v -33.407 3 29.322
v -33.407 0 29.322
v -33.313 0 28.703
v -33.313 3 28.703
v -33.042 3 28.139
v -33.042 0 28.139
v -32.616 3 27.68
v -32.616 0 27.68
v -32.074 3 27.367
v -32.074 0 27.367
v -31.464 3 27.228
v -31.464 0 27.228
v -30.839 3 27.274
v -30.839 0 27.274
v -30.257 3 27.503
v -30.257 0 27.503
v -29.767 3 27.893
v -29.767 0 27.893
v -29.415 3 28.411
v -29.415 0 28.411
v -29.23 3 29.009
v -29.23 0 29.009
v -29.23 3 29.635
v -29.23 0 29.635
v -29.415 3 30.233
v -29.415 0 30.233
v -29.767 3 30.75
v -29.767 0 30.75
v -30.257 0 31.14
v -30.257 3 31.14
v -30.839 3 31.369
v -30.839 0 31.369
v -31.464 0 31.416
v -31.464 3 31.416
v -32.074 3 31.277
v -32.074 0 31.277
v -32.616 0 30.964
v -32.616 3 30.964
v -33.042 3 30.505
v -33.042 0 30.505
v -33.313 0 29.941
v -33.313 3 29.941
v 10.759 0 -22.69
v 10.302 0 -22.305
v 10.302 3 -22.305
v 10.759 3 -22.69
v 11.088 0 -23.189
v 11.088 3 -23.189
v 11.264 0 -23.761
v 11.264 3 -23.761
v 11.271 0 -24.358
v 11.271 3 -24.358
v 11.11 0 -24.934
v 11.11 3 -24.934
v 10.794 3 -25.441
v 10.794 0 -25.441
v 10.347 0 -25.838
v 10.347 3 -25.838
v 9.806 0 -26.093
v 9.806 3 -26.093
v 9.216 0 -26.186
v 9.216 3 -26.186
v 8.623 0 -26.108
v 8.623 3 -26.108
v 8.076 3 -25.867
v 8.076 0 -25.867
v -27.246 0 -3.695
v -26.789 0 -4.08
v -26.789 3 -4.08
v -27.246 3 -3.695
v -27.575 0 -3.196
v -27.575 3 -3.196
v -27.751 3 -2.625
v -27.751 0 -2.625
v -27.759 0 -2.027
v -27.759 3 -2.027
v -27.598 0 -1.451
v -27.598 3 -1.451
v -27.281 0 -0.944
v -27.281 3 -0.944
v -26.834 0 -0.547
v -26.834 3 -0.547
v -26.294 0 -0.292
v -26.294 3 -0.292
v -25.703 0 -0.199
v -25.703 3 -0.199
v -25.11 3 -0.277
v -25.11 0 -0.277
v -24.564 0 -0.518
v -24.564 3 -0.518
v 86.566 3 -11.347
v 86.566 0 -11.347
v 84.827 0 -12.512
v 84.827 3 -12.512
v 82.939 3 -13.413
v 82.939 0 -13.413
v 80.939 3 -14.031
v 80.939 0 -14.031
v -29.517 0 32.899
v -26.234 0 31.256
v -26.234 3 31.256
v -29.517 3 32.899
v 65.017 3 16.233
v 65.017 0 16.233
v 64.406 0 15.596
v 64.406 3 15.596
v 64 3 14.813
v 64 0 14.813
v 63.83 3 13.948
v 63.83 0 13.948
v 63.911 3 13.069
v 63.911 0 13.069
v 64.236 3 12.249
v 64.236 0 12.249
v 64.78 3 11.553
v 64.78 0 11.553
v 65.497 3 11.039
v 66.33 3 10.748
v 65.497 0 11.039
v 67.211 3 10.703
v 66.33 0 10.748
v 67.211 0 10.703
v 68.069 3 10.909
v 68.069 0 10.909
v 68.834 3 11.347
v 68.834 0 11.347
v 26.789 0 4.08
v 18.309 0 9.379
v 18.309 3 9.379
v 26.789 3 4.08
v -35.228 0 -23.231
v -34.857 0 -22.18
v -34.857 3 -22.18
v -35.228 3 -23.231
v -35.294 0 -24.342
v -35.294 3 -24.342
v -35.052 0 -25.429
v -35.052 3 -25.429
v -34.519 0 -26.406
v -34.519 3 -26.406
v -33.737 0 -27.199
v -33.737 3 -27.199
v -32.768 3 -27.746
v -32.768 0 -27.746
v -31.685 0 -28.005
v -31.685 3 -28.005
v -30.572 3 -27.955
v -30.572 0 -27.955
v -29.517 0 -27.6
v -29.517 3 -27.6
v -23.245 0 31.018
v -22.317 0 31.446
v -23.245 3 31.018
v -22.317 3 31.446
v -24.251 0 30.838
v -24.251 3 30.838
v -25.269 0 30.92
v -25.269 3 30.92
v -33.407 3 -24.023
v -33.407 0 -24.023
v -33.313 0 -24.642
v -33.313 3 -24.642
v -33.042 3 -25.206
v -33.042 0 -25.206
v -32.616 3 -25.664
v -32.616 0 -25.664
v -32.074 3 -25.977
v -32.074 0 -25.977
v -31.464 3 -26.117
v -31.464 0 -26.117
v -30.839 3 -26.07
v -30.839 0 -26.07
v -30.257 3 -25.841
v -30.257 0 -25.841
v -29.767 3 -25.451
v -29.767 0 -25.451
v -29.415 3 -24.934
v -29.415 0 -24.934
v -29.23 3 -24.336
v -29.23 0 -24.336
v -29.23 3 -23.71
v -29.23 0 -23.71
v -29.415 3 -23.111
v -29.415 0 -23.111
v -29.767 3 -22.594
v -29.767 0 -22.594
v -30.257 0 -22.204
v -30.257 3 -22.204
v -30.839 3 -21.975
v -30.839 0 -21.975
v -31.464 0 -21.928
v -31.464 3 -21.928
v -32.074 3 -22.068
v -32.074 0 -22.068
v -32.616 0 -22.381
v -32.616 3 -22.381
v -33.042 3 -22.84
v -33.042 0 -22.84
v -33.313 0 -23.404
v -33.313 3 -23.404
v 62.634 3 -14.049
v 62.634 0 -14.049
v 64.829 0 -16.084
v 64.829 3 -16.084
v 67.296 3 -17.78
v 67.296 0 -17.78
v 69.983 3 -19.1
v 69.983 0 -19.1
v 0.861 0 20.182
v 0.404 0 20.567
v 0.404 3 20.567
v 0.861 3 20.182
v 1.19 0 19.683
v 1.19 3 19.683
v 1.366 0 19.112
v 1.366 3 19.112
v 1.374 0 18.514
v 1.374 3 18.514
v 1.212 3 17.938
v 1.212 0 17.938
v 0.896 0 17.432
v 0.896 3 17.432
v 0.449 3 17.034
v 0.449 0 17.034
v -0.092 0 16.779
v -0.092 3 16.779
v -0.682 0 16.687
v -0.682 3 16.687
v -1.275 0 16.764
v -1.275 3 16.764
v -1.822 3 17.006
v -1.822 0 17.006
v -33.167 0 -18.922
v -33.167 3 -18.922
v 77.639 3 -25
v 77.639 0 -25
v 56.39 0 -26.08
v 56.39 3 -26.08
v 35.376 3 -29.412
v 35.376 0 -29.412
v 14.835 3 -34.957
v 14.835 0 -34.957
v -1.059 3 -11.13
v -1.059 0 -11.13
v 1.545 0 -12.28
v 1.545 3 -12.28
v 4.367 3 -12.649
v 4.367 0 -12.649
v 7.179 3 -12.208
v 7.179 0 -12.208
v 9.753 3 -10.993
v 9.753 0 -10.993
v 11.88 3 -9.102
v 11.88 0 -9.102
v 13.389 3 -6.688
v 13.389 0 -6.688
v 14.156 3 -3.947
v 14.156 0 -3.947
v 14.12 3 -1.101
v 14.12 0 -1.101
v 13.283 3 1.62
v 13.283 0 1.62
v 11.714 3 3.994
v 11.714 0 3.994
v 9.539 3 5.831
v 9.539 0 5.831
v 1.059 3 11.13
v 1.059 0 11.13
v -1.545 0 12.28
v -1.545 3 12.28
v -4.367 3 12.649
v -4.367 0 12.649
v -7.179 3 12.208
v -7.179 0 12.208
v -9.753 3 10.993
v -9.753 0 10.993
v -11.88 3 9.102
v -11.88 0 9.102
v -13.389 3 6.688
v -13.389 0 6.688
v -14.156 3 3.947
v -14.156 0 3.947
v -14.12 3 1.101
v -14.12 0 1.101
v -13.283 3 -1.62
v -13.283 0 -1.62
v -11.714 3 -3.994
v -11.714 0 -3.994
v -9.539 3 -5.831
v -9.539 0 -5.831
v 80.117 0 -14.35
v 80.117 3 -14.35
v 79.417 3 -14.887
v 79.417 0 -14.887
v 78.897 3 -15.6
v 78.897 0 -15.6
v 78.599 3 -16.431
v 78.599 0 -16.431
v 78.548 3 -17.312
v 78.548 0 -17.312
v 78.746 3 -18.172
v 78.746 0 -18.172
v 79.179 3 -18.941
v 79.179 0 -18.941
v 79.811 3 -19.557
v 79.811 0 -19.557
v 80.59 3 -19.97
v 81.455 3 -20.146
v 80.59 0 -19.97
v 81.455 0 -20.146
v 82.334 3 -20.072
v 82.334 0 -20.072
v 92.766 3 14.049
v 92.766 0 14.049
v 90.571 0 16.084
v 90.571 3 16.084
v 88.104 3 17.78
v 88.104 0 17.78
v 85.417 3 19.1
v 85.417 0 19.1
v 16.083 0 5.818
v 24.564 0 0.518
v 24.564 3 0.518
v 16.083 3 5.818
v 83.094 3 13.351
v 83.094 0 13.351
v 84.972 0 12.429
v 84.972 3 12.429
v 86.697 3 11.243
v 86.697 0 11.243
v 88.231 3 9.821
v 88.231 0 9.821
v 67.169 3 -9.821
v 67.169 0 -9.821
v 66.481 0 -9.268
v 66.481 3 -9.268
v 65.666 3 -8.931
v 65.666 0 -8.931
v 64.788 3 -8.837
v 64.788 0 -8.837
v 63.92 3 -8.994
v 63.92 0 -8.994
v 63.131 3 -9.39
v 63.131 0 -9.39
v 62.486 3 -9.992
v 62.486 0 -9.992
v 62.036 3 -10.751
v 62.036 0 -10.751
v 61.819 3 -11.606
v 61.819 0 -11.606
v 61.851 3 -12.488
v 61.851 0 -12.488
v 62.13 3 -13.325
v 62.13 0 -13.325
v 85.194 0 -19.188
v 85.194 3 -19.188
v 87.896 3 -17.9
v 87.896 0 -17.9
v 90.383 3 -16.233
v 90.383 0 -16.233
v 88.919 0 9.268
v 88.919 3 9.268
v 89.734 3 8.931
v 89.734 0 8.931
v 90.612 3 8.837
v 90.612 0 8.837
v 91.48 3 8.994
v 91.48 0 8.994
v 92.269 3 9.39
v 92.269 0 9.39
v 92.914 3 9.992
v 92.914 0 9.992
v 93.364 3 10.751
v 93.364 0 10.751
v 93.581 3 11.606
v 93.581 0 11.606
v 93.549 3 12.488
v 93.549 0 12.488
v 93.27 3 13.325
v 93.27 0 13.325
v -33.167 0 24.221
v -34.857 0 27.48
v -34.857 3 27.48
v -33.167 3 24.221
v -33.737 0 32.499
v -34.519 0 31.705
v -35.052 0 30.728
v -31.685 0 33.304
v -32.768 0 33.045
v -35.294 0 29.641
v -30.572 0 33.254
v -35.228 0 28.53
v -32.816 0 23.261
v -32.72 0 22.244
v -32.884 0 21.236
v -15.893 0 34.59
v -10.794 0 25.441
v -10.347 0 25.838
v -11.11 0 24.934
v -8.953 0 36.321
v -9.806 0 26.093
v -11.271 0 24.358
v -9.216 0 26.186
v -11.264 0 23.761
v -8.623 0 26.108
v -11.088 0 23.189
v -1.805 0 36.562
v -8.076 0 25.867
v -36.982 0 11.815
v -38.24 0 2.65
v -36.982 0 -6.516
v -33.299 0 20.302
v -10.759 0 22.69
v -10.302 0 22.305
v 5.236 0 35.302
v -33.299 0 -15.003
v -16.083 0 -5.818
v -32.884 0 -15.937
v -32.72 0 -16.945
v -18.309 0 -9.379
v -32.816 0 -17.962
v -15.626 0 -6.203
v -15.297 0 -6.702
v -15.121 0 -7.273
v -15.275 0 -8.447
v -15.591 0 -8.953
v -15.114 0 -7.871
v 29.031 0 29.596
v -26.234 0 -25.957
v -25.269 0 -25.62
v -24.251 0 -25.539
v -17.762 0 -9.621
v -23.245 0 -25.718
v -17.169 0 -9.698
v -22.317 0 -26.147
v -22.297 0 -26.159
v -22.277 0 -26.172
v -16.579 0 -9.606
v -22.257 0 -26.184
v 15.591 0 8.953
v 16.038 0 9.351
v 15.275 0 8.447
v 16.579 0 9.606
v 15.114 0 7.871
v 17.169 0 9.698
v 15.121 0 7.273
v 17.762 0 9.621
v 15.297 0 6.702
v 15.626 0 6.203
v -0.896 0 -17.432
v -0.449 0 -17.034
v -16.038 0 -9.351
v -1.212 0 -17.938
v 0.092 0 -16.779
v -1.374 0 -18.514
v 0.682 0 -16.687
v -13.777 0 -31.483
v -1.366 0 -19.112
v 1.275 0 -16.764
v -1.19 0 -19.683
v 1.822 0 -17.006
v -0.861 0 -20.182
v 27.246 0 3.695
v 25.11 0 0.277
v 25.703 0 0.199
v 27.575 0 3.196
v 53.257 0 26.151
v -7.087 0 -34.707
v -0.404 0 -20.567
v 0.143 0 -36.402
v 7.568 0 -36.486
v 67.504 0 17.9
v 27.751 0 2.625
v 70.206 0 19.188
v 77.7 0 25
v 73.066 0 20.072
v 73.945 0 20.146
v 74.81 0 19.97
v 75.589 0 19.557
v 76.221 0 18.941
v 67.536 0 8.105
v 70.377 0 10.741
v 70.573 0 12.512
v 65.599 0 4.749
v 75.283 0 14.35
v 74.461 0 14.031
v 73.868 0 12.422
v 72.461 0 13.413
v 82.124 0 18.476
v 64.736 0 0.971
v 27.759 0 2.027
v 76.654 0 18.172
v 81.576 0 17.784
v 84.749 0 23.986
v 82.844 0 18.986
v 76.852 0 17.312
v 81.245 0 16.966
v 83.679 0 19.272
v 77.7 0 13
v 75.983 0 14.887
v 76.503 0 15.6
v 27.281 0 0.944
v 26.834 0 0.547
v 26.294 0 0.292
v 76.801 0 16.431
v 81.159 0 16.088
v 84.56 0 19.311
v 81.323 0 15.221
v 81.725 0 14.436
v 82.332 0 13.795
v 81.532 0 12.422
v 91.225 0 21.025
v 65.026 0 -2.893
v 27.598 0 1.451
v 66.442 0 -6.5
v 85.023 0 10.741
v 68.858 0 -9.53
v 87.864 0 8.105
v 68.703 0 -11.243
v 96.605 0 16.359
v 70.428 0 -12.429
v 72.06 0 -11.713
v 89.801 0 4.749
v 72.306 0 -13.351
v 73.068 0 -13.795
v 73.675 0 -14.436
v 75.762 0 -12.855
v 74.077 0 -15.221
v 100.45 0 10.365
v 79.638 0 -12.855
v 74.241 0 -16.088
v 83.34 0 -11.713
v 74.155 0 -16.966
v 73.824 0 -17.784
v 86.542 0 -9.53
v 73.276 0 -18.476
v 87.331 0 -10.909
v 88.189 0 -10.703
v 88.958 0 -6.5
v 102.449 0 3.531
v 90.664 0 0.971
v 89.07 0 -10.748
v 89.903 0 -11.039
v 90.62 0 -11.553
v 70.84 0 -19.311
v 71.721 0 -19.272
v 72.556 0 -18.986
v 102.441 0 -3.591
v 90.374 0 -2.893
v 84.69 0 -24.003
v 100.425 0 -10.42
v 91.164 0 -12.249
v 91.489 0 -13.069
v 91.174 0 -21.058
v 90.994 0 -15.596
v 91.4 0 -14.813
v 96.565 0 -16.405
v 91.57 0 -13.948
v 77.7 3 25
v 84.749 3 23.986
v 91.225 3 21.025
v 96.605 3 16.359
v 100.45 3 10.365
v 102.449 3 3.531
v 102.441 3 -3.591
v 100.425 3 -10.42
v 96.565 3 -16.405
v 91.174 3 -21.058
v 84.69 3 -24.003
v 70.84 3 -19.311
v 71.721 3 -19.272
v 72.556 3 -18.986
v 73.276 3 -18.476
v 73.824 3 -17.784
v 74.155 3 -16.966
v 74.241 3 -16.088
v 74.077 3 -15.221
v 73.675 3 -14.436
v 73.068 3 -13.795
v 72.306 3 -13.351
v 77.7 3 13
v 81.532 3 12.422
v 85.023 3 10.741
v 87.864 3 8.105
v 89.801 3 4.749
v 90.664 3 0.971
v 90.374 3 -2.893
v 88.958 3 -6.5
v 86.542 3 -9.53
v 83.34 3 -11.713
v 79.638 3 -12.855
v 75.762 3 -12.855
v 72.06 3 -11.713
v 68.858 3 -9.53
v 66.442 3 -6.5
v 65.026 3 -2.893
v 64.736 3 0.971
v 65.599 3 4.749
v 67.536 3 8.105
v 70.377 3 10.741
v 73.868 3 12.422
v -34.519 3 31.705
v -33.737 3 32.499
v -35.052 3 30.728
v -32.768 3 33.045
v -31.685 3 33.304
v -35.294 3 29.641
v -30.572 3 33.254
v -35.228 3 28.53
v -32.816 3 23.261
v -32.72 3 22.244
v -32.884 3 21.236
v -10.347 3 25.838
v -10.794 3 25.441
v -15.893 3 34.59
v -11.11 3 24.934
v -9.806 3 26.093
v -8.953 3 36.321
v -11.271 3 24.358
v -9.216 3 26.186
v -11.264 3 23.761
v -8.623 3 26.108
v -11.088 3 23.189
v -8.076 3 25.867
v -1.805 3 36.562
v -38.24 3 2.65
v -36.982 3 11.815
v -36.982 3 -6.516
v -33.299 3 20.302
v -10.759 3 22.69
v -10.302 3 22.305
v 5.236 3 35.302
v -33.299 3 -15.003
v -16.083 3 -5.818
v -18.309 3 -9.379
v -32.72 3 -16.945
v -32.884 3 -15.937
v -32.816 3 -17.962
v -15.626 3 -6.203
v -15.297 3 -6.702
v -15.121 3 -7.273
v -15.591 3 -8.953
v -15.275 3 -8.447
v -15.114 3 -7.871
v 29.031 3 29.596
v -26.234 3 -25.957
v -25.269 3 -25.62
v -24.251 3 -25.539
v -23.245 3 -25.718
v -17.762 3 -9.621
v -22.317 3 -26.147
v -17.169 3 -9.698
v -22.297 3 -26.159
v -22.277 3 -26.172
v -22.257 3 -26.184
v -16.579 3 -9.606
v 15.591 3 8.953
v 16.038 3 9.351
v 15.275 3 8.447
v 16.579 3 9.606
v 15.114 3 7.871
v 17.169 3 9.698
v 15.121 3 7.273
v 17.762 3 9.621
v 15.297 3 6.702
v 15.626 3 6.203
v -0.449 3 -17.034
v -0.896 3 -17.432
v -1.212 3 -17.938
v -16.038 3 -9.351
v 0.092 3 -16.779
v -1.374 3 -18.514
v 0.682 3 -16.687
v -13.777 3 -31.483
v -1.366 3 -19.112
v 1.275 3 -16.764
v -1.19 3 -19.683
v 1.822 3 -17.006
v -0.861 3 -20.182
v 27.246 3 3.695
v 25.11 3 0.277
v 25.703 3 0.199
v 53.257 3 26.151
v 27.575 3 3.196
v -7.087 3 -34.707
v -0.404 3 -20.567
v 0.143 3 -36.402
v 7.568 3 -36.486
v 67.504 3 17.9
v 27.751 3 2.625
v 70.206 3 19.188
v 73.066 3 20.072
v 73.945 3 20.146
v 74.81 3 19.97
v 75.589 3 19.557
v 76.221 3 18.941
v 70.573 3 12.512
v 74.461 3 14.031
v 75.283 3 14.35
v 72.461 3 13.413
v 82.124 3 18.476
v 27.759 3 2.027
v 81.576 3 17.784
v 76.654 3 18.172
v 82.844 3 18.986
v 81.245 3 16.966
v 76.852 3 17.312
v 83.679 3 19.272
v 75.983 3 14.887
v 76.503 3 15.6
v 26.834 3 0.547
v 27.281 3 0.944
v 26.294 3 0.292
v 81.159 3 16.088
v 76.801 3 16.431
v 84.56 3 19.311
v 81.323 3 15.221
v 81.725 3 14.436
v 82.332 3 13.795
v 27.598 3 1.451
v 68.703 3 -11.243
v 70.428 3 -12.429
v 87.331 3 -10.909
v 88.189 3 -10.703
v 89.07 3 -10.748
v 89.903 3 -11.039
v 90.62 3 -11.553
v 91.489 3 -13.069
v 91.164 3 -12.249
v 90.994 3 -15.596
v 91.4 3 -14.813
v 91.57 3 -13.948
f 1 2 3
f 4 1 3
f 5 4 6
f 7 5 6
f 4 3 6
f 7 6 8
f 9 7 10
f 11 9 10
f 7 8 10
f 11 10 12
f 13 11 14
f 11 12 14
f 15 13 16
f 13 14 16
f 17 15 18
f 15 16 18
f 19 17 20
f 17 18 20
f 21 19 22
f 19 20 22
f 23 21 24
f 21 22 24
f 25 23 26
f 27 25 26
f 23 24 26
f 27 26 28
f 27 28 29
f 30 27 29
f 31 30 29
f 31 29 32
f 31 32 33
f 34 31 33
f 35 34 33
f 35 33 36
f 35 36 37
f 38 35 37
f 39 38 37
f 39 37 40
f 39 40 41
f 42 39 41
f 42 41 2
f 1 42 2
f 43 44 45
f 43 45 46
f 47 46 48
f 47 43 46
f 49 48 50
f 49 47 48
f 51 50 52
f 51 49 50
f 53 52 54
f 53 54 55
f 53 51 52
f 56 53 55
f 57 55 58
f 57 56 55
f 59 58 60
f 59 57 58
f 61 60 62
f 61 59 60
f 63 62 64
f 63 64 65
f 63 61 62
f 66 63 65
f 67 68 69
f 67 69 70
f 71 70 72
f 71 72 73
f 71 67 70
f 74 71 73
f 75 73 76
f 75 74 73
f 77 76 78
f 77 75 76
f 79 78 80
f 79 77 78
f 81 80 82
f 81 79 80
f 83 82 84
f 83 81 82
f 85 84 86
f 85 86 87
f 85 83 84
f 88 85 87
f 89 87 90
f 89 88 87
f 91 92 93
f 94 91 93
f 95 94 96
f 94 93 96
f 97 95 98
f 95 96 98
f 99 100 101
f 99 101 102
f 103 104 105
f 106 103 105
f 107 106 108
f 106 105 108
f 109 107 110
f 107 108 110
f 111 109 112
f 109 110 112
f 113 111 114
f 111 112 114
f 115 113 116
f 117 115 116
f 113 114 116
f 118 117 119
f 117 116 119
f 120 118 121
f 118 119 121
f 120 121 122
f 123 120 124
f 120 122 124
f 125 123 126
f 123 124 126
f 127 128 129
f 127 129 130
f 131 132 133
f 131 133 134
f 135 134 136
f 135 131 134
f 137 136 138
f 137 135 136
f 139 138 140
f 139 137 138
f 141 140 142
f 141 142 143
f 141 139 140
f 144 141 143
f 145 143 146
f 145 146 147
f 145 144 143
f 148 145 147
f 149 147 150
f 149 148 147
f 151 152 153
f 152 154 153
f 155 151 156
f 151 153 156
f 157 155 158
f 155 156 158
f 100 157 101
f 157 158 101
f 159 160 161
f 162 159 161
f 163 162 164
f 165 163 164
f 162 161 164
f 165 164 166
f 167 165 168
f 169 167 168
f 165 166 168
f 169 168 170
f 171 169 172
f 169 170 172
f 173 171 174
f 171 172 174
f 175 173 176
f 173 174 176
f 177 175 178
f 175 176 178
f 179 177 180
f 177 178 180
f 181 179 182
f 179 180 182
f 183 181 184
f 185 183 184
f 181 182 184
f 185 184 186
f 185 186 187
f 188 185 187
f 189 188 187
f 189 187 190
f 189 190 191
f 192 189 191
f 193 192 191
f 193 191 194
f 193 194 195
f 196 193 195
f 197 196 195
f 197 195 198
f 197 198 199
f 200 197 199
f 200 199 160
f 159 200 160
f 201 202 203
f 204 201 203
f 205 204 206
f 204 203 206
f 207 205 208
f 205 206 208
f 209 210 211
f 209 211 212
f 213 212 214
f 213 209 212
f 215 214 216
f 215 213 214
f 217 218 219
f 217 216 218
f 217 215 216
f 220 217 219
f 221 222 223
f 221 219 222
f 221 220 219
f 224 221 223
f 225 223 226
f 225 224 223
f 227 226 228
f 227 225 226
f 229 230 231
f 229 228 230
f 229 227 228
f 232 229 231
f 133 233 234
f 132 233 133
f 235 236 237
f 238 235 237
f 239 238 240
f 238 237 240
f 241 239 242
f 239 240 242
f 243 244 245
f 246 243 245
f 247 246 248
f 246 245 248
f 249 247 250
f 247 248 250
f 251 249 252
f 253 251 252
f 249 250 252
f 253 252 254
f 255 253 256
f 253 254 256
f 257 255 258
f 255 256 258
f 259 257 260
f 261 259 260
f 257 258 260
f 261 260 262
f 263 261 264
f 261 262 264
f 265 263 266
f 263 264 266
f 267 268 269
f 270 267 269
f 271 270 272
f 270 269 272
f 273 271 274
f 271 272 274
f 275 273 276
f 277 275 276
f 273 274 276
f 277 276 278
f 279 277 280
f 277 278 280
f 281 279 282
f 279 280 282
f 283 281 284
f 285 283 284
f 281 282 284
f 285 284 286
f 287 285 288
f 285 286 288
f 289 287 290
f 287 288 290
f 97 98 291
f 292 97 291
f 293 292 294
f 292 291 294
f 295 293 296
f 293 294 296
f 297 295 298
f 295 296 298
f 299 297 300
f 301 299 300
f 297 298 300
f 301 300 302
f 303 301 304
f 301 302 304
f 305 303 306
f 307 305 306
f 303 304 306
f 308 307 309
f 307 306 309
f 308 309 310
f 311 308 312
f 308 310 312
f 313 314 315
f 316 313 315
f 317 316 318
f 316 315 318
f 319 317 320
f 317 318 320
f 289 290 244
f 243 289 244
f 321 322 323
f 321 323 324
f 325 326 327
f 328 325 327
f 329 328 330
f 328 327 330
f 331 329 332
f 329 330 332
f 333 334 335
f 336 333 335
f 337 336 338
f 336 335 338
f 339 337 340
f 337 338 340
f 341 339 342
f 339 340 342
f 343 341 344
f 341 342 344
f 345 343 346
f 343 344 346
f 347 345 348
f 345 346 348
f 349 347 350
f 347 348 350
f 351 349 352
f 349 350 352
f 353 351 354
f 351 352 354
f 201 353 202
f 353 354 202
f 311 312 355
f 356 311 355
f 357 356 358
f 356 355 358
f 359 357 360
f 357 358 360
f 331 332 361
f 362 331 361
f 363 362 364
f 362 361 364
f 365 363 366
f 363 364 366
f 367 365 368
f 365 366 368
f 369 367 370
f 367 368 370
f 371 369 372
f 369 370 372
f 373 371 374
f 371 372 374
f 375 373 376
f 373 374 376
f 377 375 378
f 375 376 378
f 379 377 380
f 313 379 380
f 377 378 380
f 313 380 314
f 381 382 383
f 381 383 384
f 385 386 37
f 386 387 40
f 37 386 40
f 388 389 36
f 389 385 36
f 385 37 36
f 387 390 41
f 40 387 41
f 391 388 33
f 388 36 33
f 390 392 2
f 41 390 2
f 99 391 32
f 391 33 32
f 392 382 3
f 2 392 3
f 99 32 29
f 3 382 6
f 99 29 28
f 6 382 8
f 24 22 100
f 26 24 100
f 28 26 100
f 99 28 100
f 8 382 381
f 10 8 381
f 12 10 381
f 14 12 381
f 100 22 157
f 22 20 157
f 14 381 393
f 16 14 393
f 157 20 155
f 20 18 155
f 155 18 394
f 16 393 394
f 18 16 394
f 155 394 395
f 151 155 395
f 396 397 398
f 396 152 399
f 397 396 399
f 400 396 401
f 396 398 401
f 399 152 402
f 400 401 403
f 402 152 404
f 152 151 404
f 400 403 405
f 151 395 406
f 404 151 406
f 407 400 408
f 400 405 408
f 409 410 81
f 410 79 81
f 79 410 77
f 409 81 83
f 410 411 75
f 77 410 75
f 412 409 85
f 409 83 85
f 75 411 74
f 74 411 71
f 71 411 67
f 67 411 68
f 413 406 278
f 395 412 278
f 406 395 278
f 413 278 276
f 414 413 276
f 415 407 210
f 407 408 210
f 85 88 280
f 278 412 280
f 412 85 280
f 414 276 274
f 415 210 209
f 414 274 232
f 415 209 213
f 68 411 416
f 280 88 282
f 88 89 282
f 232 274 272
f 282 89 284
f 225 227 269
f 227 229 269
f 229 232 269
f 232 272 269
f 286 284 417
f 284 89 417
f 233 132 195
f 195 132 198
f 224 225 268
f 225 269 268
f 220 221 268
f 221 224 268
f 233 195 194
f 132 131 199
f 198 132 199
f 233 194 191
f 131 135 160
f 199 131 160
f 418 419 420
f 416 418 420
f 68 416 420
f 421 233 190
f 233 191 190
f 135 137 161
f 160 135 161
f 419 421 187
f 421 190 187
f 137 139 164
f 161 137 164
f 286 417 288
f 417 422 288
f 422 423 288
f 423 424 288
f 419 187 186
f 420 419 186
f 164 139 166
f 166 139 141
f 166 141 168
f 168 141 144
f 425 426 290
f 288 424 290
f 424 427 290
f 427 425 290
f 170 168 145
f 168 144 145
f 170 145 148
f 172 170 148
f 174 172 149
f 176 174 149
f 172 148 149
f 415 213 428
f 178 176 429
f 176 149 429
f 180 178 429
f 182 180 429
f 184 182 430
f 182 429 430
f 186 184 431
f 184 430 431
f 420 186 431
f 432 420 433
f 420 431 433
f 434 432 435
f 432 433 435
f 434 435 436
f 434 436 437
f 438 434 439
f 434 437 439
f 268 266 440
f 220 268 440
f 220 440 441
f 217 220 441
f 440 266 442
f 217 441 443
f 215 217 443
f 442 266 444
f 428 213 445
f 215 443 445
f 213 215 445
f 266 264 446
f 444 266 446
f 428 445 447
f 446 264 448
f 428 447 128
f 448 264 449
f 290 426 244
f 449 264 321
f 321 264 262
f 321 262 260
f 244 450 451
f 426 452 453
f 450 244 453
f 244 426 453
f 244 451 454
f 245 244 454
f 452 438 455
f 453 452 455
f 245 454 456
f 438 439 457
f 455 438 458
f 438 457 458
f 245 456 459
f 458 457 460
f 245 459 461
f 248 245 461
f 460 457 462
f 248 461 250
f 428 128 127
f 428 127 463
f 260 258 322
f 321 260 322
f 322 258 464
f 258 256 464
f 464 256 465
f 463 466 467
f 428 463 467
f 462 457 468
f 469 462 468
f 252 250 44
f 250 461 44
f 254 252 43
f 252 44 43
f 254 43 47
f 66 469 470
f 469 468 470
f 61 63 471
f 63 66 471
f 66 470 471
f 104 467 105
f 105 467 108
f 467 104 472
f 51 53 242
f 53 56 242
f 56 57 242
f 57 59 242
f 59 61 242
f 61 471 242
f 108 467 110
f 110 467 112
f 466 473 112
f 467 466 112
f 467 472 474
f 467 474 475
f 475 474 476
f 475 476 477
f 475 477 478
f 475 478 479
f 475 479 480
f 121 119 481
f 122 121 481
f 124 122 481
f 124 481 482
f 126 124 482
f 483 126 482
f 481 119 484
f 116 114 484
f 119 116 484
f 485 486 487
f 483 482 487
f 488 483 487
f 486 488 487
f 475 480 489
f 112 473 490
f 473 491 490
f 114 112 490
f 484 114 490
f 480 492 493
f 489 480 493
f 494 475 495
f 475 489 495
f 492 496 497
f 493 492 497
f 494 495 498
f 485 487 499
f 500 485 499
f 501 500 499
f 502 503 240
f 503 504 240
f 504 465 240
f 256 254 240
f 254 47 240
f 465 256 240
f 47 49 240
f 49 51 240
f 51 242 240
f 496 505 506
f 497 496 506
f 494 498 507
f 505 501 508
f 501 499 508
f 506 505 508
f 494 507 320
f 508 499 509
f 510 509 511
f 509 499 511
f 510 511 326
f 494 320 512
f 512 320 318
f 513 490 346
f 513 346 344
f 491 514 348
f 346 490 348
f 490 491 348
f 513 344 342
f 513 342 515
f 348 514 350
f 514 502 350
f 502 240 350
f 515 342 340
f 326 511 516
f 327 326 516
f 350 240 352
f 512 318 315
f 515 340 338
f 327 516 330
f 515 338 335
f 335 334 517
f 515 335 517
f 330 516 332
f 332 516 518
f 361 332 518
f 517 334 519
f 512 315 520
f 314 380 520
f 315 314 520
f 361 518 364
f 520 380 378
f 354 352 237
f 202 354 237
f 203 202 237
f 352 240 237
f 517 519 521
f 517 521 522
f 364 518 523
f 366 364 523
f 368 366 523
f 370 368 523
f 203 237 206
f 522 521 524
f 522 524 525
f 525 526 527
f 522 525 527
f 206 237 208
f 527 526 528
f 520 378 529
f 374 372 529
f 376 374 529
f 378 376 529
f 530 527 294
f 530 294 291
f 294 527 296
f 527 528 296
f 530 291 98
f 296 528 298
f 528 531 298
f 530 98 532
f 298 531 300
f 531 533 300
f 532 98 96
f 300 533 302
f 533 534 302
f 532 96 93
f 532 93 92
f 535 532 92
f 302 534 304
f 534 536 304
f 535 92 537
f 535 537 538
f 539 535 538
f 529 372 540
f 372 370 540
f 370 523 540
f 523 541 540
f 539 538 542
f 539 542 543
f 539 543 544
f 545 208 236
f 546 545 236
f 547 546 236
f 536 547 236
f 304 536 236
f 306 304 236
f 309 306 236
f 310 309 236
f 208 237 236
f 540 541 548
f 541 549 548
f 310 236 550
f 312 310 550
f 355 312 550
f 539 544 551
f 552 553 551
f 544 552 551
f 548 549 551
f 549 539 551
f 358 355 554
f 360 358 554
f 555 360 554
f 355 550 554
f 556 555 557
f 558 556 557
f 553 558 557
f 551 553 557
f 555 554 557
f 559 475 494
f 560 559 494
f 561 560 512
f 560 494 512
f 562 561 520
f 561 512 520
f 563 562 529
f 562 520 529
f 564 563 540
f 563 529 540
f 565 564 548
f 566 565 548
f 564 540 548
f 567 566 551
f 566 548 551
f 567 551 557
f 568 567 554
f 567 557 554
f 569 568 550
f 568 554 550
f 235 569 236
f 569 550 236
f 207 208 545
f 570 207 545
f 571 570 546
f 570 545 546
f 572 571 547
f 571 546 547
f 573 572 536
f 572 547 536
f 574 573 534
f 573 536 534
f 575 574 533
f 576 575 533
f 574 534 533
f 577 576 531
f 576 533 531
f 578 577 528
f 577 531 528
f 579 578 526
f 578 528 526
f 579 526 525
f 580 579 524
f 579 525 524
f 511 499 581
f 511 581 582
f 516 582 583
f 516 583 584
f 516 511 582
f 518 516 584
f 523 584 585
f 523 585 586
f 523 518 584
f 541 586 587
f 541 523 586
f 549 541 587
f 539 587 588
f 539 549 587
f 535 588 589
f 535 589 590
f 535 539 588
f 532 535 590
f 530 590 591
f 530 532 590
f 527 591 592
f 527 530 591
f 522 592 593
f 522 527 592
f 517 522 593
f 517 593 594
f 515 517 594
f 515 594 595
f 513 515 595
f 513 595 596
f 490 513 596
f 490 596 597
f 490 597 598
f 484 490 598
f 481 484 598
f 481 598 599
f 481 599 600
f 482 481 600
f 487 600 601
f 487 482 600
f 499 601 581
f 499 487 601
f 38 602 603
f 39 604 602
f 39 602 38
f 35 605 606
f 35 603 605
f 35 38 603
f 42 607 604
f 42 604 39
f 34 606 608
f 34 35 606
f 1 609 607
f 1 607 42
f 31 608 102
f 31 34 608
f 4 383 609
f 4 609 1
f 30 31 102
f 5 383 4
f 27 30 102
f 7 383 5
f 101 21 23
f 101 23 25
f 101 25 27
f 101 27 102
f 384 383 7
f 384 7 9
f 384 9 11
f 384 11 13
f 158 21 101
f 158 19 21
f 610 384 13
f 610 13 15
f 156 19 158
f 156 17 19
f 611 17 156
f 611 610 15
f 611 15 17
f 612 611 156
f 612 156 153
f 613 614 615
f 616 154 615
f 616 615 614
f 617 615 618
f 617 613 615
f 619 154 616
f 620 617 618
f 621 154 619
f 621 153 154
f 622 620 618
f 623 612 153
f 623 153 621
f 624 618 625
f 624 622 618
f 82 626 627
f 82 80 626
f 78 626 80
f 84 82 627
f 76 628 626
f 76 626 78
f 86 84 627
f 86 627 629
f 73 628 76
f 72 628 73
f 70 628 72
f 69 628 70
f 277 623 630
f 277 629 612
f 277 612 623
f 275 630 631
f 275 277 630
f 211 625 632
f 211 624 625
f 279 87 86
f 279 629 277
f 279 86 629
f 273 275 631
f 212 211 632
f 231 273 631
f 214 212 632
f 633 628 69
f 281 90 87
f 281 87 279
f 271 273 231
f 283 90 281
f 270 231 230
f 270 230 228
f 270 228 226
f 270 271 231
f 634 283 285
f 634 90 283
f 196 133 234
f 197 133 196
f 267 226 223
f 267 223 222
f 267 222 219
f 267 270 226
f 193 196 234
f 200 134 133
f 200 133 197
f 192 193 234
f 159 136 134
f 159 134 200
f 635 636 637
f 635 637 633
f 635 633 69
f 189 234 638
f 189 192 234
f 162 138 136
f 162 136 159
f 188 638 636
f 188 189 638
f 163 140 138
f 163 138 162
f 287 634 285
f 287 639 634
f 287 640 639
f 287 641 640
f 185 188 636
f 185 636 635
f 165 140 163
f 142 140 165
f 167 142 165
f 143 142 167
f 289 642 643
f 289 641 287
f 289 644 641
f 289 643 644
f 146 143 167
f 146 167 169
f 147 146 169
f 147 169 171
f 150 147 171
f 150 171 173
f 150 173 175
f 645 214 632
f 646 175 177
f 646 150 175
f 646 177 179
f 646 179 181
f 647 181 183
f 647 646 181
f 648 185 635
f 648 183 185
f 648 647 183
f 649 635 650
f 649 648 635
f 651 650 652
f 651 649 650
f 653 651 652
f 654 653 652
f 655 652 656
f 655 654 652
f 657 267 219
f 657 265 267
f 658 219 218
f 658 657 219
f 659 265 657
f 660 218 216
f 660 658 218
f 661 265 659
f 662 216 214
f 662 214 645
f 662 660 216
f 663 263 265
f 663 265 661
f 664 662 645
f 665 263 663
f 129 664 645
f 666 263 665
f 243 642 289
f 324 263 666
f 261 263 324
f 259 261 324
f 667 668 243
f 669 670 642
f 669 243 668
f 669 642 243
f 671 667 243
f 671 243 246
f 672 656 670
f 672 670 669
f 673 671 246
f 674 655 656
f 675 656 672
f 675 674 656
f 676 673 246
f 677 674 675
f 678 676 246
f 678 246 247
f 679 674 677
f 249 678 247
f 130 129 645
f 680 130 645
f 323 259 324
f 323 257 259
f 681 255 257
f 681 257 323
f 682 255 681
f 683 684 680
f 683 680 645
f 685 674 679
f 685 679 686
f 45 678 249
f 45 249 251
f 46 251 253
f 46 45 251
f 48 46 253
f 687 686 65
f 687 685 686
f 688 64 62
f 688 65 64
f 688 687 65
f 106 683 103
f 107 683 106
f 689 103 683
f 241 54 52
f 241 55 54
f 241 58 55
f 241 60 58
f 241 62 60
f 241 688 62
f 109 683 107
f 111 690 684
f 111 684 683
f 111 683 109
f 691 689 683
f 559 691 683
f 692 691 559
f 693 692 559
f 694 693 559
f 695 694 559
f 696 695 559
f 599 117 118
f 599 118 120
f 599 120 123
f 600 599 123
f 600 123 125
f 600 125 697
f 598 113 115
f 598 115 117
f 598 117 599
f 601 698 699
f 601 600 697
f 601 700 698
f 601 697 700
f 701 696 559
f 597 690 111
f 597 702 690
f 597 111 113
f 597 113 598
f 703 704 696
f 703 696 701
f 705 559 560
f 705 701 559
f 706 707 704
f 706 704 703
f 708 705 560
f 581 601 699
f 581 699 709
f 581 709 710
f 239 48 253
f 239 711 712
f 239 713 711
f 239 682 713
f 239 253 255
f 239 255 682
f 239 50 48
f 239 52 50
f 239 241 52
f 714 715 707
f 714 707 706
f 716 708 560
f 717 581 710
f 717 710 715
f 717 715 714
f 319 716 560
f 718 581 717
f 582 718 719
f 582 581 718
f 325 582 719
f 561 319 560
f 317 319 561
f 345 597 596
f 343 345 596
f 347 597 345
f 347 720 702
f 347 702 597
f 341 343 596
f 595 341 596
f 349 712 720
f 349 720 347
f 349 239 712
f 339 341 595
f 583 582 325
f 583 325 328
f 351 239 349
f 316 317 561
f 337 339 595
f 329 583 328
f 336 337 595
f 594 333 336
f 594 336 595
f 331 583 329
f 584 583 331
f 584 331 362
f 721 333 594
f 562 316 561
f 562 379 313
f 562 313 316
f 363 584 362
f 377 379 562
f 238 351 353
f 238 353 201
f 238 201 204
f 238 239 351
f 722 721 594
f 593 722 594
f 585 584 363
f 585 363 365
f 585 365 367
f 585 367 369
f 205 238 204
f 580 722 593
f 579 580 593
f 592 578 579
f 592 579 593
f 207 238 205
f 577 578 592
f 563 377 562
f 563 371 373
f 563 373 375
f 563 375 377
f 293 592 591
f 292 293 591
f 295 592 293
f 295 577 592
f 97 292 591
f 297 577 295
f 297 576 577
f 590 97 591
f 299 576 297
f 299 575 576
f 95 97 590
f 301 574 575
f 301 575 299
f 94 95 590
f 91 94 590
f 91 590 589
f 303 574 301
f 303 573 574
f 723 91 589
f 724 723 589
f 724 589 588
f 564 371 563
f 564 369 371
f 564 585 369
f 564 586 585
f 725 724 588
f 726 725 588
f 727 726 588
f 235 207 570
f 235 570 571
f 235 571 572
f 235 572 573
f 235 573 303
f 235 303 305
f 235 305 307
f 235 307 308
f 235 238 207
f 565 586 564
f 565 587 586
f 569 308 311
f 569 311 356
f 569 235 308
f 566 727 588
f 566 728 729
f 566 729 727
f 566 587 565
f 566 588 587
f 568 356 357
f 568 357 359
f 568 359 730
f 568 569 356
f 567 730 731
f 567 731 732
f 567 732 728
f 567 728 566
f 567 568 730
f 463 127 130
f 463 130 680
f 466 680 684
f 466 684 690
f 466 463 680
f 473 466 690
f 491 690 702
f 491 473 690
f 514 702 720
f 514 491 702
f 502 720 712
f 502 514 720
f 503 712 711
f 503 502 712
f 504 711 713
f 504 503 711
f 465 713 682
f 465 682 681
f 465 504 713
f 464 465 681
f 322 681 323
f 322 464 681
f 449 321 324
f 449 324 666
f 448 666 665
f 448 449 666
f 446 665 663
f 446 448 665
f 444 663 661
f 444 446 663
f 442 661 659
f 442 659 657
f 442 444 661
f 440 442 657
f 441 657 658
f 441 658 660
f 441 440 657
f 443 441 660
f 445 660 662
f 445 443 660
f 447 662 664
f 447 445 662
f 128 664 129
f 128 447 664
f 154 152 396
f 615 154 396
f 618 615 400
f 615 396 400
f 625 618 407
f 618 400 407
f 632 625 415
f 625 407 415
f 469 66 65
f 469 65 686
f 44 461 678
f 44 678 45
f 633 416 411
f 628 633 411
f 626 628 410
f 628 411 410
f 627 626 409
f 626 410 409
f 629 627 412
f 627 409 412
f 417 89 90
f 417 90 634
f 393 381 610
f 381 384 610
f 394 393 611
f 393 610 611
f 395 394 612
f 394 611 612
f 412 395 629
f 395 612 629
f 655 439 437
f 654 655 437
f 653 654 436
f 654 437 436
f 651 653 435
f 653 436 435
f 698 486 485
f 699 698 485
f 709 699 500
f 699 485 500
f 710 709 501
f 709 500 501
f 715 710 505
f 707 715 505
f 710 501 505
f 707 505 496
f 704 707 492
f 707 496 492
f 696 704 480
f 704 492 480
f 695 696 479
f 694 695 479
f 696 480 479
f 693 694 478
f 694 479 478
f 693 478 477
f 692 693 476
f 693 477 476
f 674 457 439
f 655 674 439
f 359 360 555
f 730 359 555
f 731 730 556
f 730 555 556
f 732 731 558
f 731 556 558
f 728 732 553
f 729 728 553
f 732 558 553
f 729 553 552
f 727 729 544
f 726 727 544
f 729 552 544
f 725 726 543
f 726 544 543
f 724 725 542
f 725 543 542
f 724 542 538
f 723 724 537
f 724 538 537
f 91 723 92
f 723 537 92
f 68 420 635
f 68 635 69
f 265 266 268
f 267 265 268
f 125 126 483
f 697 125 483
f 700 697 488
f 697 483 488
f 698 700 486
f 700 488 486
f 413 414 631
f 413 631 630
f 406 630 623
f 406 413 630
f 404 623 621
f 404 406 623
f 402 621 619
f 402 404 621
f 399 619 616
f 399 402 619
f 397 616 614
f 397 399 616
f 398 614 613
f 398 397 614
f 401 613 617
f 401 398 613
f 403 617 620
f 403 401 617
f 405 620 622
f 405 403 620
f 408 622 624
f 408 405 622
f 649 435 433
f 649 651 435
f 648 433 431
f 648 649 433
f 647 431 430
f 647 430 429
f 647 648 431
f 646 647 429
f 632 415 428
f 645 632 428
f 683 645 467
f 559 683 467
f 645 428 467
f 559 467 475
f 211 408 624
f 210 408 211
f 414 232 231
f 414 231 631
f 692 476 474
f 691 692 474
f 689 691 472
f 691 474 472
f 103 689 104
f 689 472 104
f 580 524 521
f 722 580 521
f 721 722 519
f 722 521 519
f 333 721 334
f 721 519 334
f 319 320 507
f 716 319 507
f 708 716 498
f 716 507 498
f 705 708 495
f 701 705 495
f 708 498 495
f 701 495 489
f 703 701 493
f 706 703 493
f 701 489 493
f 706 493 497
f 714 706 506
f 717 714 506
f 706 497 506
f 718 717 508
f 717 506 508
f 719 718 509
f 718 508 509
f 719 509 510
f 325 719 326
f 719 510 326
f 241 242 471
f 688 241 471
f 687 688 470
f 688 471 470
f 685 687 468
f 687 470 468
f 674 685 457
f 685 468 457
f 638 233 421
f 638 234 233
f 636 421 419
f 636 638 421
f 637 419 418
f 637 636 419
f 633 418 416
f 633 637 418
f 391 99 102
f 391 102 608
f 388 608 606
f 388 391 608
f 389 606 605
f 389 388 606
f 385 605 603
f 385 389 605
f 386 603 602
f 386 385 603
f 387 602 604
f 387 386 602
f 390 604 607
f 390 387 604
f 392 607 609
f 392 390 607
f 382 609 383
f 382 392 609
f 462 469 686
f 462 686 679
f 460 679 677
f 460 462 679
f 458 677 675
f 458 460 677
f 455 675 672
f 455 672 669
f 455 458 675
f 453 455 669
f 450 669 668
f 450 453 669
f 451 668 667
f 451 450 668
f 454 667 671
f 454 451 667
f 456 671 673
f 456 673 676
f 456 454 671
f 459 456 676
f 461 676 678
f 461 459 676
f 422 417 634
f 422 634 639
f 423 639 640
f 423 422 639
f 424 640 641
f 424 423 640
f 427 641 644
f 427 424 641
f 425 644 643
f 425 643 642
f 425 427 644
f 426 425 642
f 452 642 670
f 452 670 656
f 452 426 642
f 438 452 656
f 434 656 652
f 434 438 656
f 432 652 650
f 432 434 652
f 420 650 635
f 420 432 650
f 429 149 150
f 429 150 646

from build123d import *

# Parameters (mm, degrees)
SKETCH_2_R               = 13
EXTRUDE_1_DEPTH          = 3
CUT_EXTRUDE_2_DEPTH      = 110.084751045
PATTERN_CURVE_1_DEPTH    = 3
CUT_EXTRUDE_4_DEPTH      = 110.084751045
PATTERN_CIRCULAR_1_COUNT = 6
EXTRUDE_2_DEPTH          = 3
HOLE_WIZARD_M4_1_D       = 4.2
FILLET_1_R               = 4


# Read off the part's stored shape, not the designer's step: 곡선 패턴1
with BuildPart() as part:
    # 스케치2 → 보스-돌출1 (new body)
    with BuildSketch(Plane(origin=(0, 0, 0), x_dir=(1, 0, 0), z_dir=(0, 1, 0))):
        with BuildLine():
            ThreePointArc((77.639466647, 24.999926714), (45.838842968, 27.466341176), (14.834721753, 34.956824097))
            ThreePointArc((14.834721753, 34.956824097), (0.14257607, 36.40176879), (-13.777014503, 31.48323159))
            Line((-13.777014503, 31.48323159), (-22.257495465, 26.184038948))
            ThreePointArc((-22.257495465, 26.184038948), (-35.278632699, -16.528292532), (5.235906124, -35.302354942))
            ThreePointArc((5.235906124, -35.302354942), (41.103608721, -27.588473828), (77.7, -25))
            ThreePointArc((77.7, -25), (102.699981679, 0.030266699), (77.639466647, 24.999926714))
        make_face()
        with BuildLine():
            Line((-9.539433123, 5.83088464), (-1.058952162, 11.130077283))
            ThreePointArc((-1.058952162, 11.130077283), (12.720721442, 7.948788963), (9.539433123, -5.83088464))
            Line((9.539433123, -5.83088464), (1.058952162, -11.130077283))
            ThreePointArc((1.058952162, -11.130077283), (-12.720721442, -7.948788963), (-9.539433123, 5.83088464))
        make_face(mode=Mode.SUBTRACT)
        with Locations(Location((77.7, 0, 0), (0, 0, 270))):
            Circle(SKETCH_2_R, mode=Mode.SUBTRACT)
    extrude(amount=EXTRUDE_1_DEPTH)

    # 스케치4 → 컷-돌출2 (cut, through all)
    with BuildSketch(Plane(origin=(0, 0, 0), x_dir=(-1, 0, 0), z_dir=(0, -1, 0))):
        with BuildLine():
            Line((1.82151317, -17.005644102), (10.301994131, -22.304836745))
            ThreePointArc((10.301994131, -22.304836745), (10.970064678, -25.198568201), (8.076333221, -25.866638748))
            Line((8.076333221, -25.866638748), (-0.40414774, -20.567446106))
            ThreePointArc((-0.40414774, -20.567446106), (-1.072218287, -17.673714649), (1.82151317, -17.005644102))
        make_face()
    extrude(amount=-CUT_EXTRUDE_2_DEPTH, mode=Mode.SUBTRACT)

    # 곡선 패턴1 outline → 곡선 패턴1 (cut)
    with BuildSketch(Plane(origin=(0, 0, 0), x_dir=(1, 0, 0), z_dir=(0, 1, 0))):
        with BuildLine():
            Line((24.563551451, -0.518425872), (16.08307049, -5.817618515))
            ThreePointArc((16.08307049, -5.817618515), (15.414999943, -8.711349971), (18.308731399, -9.379420519))
            Line((18.308731399, -9.379420519), (26.789212361, -4.080227876))
            ThreePointArc((26.789212361, -4.080227876), (27.457282908, -1.186496419), (24.563551451, -0.518425872))
        make_face()
        with BuildLine():
            ThreePointArc((-16.08307049, 5.817618515), (-15.414999943, 8.711349971), (-18.308731399, 9.379420519))
            Line((-18.308731399, 9.379420519), (-26.789212361, 4.080227876))
            ThreePointArc((-26.789212361, 4.080227876), (-27.457282908, 1.186496419), (-24.563551451, 0.518425872))
            Line((-24.563551451, 0.518425872), (-16.08307049, 5.817618515))
        make_face()
        with BuildLine():
            Line((8.076333221, 25.866638748), (-0.40414774, 20.567446106))
            ThreePointArc((-0.40414774, 20.567446106), (-1.072218287, 17.673714649), (1.82151317, 17.005644102))
            Line((1.82151317, 17.005644102), (10.301994131, 22.304836745))
            ThreePointArc((10.301994131, 22.304836745), (10.970064678, 25.198568202), (8.076333221, 25.866638748))
        make_face()
    extrude(amount=PATTERN_CURVE_1_DEPTH, mode=Mode.SUBTRACT)

    # 스케치5 → 컷-돌출4 (cut, through all)
    with BuildSketch(Plane(origin=(0, 0, 0), x_dir=(-1, 0, 0), z_dir=(0, -1, 0))):
        with BuildLine():
            ThreePointArc((-73.066008281, -20.072023335), (-68.831471406, -18.593256858), (-65.017373608, -16.233021524))
            ThreePointArc((-65.017373608, -16.233021524), (-64.483090846, -11.881637615), (-68.834474755, -11.347354852))
            ThreePointArc((-68.834474755, -11.347354852), (-71.500640206, -12.997228095), (-74.460704817, -14.030928933))
            ThreePointArc((-74.460704817, -14.030928933), (-76.78390375, -17.748824402), (-73.066008281, -20.072023335))
        make_face()
    cut_extrude_4 = extrude(amount=-CUT_EXTRUDE_4_DEPTH, mode=Mode.SUBTRACT)

    # 원형 패턴1: 컷-돌출4 ×6 about axis, 2 skipped
    pattern_circular_1_axis = Axis((77.7, 3, 0), (0, -1, 0))
    add([cut_extrude_4.rotate(pattern_circular_1_axis, i * 360 / PATTERN_CIRCULAR_1_COUNT) for i in range(1, PATTERN_CIRCULAR_1_COUNT) if i not in (1, 4)], mode=Mode.SUBTRACT)

    # 스케치7 → 보스-돌출2 (add)
    with BuildSketch(Plane.XZ):
        with BuildLine():
            ThreePointArc((-34.857379721, -22.180465117), (-34.155886305, -26.830127811), (-29.517020915, -27.599792717))
            Line((-29.517020915, -27.599792717), (-24.147285754, -24.913232788))
            ThreePointArc((-24.147285754, -24.913232788), (-28.457668053, -21.214942262), (-32.092293027, -16.850741341))
            Line((-32.092293027, -16.850741341), (-34.857379721, -22.180465117))
        make_face()
        with BuildLine():
            ThreePointArc((-29.517020915, 32.898985359), (-34.155886305, 32.129320453), (-34.857379721, 27.479657759))
            Line((-34.857379721, 27.479657759), (-32.092293027, 22.149933984))
            ThreePointArc((-32.092293027, 22.149933984), (-28.457668053, 26.514134904), (-24.147285754, 30.21242543))
            Line((-24.147285754, 30.21242543), (-29.517020915, 32.898985359))
        make_face()
    extrude(amount=-EXTRUDE_2_DEPTH)

    # M4 나선 코일용 탭 드릴1 (through all)
    with Locations(Plane(origin=(0, 3, 0), x_dir=(1, 0, 0), z_dir=(0, 1, 0))):
        with Locations((-31.306777179, 24.022535036), (-31.306777179, -29.321727679)):
            Hole(HOLE_WIZARD_M4_1_D / 2)

    # 필렛1
    fillet_1_edges = [part.edges().sort_by_distance(p)[0] for p in [
        (-24.147285754, 1.5, -24.913232788),
        (-32.092293027, 1.5, -16.850741341),
        (-32.092293027, 1.5, 22.149933984),
        (-24.147285754, 1.5, 30.21242543),
    ]]
    fillet(fillet_1_edges, radius=FILLET_1_R)


solid = part.part
